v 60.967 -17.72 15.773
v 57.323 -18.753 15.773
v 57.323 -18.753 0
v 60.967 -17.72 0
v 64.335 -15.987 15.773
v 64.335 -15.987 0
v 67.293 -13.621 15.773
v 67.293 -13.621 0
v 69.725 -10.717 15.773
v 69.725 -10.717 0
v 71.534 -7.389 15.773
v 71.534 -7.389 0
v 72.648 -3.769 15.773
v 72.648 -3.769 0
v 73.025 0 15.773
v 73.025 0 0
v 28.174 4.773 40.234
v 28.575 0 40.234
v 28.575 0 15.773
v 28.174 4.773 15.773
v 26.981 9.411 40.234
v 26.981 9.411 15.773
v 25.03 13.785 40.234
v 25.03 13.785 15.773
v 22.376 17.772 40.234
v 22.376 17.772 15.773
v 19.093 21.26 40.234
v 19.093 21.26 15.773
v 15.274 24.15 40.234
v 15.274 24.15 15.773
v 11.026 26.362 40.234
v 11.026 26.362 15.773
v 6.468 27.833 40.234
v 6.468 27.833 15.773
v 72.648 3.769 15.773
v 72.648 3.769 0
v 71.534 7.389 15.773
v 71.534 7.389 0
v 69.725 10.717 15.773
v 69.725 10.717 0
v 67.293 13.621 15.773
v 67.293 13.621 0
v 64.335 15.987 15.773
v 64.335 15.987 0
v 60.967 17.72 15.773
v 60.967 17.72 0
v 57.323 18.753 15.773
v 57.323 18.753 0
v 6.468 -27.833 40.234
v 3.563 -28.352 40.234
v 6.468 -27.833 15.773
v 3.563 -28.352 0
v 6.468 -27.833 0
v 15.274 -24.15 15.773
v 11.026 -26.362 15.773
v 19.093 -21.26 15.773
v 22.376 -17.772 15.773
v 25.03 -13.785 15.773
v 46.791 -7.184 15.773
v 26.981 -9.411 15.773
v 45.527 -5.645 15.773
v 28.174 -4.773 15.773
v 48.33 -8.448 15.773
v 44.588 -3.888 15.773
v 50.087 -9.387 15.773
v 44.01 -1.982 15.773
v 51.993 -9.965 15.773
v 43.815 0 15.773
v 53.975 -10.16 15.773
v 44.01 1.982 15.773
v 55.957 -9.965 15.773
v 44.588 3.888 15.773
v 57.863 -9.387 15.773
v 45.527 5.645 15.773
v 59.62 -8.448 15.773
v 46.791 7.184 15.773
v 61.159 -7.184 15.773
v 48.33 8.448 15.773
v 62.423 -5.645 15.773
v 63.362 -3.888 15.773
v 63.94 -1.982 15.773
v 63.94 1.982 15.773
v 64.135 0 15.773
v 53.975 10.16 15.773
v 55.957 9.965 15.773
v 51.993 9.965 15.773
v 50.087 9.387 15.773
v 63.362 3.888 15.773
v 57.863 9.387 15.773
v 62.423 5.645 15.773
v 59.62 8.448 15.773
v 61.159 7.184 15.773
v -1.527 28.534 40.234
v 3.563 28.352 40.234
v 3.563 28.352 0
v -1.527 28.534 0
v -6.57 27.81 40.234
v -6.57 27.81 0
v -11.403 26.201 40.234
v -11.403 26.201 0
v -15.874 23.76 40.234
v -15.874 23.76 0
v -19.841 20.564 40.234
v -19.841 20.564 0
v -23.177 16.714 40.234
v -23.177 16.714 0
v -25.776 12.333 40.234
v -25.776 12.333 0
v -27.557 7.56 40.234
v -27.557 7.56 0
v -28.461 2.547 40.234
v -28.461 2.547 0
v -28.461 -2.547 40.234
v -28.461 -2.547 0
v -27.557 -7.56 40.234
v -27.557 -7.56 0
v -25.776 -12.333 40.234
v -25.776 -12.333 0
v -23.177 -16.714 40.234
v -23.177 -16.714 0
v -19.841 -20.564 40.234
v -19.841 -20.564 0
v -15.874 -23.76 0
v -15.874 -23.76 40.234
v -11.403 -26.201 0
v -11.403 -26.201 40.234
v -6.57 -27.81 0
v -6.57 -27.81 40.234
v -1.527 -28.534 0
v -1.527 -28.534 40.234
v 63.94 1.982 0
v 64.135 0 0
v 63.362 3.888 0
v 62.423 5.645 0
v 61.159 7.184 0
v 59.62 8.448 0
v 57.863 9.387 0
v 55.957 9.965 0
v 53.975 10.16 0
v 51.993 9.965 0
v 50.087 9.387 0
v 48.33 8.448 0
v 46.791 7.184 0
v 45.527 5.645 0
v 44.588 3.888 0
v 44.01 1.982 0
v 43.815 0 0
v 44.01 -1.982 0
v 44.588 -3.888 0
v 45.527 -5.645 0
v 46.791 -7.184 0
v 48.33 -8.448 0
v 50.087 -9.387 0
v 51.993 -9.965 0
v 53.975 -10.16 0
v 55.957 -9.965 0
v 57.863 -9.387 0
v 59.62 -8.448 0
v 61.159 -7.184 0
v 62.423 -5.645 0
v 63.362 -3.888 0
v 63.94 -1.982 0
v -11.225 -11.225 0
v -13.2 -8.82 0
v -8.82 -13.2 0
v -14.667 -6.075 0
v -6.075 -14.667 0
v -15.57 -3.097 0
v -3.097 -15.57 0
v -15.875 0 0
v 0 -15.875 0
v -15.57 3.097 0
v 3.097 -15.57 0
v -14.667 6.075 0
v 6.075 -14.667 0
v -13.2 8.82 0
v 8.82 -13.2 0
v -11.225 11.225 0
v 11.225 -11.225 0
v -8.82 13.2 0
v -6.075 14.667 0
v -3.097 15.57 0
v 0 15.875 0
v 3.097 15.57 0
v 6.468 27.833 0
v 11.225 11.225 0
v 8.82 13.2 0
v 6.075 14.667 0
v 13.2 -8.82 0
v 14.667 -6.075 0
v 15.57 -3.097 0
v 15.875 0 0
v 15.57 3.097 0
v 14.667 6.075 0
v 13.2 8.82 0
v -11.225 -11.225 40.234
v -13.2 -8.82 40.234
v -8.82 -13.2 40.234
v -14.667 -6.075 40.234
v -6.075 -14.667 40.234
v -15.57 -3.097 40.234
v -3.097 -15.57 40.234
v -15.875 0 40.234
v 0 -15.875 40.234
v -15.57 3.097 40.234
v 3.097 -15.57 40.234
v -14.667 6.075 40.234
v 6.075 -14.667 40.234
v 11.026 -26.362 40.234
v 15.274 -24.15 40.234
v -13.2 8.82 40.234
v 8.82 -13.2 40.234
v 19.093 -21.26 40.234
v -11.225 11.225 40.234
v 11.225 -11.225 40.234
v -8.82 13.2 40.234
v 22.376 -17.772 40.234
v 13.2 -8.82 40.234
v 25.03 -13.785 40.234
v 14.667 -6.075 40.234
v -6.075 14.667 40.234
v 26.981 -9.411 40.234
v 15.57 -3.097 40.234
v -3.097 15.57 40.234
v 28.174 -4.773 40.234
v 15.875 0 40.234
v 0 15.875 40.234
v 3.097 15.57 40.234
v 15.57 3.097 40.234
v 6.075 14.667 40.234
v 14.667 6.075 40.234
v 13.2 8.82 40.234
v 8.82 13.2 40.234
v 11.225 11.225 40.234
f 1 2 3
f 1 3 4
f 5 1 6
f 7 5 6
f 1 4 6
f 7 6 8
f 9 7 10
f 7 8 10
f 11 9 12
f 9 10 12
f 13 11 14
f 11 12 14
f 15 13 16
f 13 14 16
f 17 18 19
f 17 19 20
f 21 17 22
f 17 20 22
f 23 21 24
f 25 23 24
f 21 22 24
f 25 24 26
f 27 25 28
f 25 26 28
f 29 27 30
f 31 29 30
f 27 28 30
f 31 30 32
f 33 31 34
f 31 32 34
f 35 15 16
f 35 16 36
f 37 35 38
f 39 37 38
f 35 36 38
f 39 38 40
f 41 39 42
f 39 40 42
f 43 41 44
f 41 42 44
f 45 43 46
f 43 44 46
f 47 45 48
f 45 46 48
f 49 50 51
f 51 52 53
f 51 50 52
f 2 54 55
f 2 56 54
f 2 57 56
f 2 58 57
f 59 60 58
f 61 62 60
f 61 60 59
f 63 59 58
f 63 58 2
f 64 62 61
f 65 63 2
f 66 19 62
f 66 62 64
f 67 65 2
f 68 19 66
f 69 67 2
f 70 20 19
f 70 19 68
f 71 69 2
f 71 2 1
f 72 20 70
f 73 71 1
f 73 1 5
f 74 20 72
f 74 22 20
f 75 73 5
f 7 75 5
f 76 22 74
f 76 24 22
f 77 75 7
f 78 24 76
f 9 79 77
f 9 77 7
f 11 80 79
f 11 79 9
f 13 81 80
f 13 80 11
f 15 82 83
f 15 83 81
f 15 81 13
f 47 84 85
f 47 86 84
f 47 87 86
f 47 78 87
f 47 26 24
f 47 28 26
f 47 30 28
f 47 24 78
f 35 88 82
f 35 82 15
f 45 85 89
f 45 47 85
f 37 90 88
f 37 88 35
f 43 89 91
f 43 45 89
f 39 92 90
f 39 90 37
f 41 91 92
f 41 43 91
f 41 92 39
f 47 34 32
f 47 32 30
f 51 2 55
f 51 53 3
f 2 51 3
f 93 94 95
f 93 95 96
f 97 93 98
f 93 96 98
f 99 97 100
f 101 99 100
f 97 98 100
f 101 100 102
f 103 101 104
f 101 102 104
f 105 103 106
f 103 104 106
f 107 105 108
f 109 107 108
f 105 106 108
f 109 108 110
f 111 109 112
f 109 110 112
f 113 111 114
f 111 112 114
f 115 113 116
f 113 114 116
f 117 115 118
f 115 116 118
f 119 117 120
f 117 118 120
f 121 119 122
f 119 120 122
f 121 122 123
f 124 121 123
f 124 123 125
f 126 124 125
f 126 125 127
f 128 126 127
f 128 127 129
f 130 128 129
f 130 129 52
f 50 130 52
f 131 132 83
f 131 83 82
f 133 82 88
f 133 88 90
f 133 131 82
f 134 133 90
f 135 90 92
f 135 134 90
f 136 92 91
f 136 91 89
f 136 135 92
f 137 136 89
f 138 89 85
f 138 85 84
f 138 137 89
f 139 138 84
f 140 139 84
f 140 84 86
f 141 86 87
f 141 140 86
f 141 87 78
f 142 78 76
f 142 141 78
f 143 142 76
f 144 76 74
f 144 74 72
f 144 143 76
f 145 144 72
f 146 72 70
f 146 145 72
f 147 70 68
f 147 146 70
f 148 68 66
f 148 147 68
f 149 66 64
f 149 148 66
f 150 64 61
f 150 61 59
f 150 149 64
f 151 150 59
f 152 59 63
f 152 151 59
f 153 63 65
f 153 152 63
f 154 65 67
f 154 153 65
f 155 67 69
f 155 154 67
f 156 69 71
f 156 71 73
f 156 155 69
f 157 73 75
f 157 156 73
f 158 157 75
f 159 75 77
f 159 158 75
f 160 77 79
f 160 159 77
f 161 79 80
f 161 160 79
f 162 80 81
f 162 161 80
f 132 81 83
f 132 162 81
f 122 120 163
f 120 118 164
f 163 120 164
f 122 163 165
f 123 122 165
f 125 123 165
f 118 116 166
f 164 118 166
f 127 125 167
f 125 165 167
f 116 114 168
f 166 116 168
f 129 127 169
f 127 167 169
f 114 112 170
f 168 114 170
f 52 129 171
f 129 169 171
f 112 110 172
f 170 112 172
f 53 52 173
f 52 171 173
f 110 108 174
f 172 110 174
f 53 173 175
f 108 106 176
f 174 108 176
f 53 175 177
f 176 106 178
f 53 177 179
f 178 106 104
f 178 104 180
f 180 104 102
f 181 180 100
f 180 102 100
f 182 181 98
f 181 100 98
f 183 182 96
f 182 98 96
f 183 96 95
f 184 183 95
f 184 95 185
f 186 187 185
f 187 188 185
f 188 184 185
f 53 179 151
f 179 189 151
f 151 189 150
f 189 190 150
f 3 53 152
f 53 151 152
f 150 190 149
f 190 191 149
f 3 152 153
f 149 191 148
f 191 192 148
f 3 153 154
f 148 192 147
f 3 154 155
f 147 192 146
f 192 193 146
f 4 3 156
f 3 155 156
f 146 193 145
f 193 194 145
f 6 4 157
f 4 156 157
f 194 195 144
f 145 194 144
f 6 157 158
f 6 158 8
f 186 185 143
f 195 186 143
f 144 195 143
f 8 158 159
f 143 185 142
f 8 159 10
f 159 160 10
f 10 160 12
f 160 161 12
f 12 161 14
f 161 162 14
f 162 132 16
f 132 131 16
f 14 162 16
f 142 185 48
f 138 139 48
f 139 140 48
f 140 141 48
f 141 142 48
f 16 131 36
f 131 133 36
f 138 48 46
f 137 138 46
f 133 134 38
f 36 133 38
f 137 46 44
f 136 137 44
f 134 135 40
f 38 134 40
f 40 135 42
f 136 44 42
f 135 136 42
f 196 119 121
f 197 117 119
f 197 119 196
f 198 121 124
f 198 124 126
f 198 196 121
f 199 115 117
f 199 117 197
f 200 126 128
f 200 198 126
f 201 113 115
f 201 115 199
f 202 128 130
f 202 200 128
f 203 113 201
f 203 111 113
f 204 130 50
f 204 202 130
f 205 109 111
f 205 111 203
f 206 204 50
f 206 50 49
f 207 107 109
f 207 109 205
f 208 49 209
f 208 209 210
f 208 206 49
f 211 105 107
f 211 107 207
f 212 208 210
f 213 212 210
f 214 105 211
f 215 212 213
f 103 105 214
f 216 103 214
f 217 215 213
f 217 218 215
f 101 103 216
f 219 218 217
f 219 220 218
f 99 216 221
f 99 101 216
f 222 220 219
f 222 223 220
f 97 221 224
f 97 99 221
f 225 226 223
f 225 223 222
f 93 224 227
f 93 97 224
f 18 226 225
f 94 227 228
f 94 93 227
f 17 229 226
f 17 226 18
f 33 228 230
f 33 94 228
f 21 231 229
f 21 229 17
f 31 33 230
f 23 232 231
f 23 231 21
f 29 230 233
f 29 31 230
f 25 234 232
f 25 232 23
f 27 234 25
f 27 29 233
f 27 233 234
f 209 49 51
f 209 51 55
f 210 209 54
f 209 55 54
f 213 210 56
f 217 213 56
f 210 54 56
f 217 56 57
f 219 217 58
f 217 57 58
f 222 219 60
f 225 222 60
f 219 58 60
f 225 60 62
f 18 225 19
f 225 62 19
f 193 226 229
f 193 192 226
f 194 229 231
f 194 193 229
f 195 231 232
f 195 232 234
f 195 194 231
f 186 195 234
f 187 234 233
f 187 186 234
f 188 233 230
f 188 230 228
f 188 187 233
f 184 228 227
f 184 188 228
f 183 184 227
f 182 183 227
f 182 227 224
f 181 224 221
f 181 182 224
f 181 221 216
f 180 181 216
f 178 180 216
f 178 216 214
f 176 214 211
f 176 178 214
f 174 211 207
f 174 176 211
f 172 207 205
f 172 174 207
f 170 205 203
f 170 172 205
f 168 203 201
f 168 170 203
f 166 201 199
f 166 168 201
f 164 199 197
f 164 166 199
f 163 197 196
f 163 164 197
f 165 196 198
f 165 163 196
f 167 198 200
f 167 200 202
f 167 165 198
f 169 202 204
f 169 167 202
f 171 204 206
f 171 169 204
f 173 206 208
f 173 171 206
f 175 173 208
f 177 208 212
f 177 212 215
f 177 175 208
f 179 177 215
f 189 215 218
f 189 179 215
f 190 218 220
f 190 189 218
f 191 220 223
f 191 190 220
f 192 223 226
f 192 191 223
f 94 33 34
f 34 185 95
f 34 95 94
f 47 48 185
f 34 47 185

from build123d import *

# Parameters (mm, degrees)
F0_R     = 15.875
F0_R_2   = 10.16
F1_DEPTH = 15.7734
F2_R     = 15.875
F3_DEPTH = 24.4602


with BuildPart() as f1:
    # F0 (on Top) → F1 (new body)
    with BuildSketch(Plane.XY):
        with BuildLine():
            Line((6.4681247744, 27.833325114), (3.5634199556, 28.3519428474))
            ThreePointArc((3.5634199556, 28.3519428474), (-28.575, 0), (3.5634199556, -28.3519428474))
            Line((3.5634199556, -28.3519428474), (6.4681247744, -27.833325114))
            ThreePointArc((6.4681247744, -27.833325114), (22.3758495976, -17.7722249532), (28.575, 0))
            ThreePointArc((28.575, 0), (22.3758495976, 17.7722249532), (6.4681247744, 27.833325114))
        make_face()
        Circle(F0_R, mode=Mode.SUBTRACT)
        with BuildLine():
            Line((57.3233139044, 18.7534341921), (6.4681247744, 27.833325114))
            ThreePointArc((6.4681247744, 27.833325114), (22.3758495976, 17.7722249532), (28.575, 0))
            ThreePointArc((28.575, 0), (22.3758495976, -17.7722249532), (6.4681247744, -27.833325114))
            Line((6.4681247744, -27.833325114), (57.3233139044, -18.7534341921))
            ThreePointArc((57.3233139044, -18.7534341921), (34.925, 0), (57.3233139044, 18.7534341921))
        make_face()
        with BuildLine():
            ThreePointArc((73.025, 0), (68.5812979546, 12.2294137251), (57.3233139044, 18.7534341921))
            ThreePointArc((57.3233139044, 18.7534341921), (34.925, 0), (57.3233139044, -18.7534341921))
            ThreePointArc((57.3233139044, -18.7534341921), (68.5812979546, -12.2294137251), (73.025, 0))
        make_face()
        with Locations((53.975, 0)):
            Circle(F0_R_2, mode=Mode.SUBTRACT)
    extrude(amount=F1_DEPTH)

    # F2 (on face) → F3 (join)
    with BuildSketch(Plane.XY.offset(15.7734)):
        with BuildLine():
            Line((6.4681247744, 27.833325114), (3.5634199556, 28.3519428474))
            ThreePointArc((3.5634199556, 28.3519428474), (-28.575, 0), (3.5634199556, -28.3519428474))
            Line((3.5634199556, -28.3519428474), (6.4681247744, -27.833325114))
            ThreePointArc((6.4681247744, -27.833325114), (22.3758495976, -17.7722249532), (28.575, 0))
            ThreePointArc((28.575, 0), (22.3758495976, 17.7722249532), (6.4681247744, 27.833325114))
        make_face()
        Circle(F2_R, mode=Mode.SUBTRACT)
    extrude(amount=F3_DEPTH)


solid = f1.part
